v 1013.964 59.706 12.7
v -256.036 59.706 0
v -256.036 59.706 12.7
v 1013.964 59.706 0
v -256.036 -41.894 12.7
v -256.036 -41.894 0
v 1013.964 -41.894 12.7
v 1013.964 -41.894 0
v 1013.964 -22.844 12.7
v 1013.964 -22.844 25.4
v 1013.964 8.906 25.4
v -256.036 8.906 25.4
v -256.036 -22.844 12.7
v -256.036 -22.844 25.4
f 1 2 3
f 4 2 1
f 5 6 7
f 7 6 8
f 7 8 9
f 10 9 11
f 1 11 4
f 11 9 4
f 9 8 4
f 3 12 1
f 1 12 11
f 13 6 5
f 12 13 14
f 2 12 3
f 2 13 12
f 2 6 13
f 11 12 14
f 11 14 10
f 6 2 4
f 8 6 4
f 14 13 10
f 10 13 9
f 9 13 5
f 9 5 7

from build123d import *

# Parameters (mm, degrees)
F0_W      = 1270
F0_H      = 82.55
F1_DEPTH  = 12.7
F0_H_2    = 19.05
F1_FACE_W = 1270
F1_FACE_H = 82.55
F2_DEPTH  = 12.7
F3_SIZE2  = 50.8
F3_SIZE   = 12.7


with BuildPart() as f1:
    # F0 (on Top) → F1 (new body)
    with BuildSketch(Plane.XY):
        with Locations((378.9642523047, 18.4307628065)):
            Rectangle(F0_W, F0_H)
    extrude(amount=F1_DEPTH)

    # F0 (on Top) + F1_face (on face) → F2 (join)
    with BuildSketch(Plane.XY):
        with Locations((378.9642523047, 18.4307628065)):
            Rectangle(F0_W, F0_H)
        with Locations((378.9642523047, -32.3692371935)):
            Rectangle(F0_W, F0_H_2)
    with BuildSketch(Plane(origin=(378.9642523047, 18.4307628065, 12.7), x_dir=(1, 0, 0), z_dir=(0, 0, 1))):
        Rectangle(F1_FACE_W, F1_FACE_H)
    extrude(amount=F2_DEPTH)

    # F3
    f3_edges = [f1.edges().sort_by_distance(p)[0] for p in [
        (378.964252, 59.705763, 25.4),
    ]]
    f3_side = f1.faces().sort_by_distance((378.964252, 59.705763, 12.7))[0]
    chamfer(f3_edges, length=F3_SIZE, length2=F3_SIZE2, reference=f3_side)


solid = f1.part
